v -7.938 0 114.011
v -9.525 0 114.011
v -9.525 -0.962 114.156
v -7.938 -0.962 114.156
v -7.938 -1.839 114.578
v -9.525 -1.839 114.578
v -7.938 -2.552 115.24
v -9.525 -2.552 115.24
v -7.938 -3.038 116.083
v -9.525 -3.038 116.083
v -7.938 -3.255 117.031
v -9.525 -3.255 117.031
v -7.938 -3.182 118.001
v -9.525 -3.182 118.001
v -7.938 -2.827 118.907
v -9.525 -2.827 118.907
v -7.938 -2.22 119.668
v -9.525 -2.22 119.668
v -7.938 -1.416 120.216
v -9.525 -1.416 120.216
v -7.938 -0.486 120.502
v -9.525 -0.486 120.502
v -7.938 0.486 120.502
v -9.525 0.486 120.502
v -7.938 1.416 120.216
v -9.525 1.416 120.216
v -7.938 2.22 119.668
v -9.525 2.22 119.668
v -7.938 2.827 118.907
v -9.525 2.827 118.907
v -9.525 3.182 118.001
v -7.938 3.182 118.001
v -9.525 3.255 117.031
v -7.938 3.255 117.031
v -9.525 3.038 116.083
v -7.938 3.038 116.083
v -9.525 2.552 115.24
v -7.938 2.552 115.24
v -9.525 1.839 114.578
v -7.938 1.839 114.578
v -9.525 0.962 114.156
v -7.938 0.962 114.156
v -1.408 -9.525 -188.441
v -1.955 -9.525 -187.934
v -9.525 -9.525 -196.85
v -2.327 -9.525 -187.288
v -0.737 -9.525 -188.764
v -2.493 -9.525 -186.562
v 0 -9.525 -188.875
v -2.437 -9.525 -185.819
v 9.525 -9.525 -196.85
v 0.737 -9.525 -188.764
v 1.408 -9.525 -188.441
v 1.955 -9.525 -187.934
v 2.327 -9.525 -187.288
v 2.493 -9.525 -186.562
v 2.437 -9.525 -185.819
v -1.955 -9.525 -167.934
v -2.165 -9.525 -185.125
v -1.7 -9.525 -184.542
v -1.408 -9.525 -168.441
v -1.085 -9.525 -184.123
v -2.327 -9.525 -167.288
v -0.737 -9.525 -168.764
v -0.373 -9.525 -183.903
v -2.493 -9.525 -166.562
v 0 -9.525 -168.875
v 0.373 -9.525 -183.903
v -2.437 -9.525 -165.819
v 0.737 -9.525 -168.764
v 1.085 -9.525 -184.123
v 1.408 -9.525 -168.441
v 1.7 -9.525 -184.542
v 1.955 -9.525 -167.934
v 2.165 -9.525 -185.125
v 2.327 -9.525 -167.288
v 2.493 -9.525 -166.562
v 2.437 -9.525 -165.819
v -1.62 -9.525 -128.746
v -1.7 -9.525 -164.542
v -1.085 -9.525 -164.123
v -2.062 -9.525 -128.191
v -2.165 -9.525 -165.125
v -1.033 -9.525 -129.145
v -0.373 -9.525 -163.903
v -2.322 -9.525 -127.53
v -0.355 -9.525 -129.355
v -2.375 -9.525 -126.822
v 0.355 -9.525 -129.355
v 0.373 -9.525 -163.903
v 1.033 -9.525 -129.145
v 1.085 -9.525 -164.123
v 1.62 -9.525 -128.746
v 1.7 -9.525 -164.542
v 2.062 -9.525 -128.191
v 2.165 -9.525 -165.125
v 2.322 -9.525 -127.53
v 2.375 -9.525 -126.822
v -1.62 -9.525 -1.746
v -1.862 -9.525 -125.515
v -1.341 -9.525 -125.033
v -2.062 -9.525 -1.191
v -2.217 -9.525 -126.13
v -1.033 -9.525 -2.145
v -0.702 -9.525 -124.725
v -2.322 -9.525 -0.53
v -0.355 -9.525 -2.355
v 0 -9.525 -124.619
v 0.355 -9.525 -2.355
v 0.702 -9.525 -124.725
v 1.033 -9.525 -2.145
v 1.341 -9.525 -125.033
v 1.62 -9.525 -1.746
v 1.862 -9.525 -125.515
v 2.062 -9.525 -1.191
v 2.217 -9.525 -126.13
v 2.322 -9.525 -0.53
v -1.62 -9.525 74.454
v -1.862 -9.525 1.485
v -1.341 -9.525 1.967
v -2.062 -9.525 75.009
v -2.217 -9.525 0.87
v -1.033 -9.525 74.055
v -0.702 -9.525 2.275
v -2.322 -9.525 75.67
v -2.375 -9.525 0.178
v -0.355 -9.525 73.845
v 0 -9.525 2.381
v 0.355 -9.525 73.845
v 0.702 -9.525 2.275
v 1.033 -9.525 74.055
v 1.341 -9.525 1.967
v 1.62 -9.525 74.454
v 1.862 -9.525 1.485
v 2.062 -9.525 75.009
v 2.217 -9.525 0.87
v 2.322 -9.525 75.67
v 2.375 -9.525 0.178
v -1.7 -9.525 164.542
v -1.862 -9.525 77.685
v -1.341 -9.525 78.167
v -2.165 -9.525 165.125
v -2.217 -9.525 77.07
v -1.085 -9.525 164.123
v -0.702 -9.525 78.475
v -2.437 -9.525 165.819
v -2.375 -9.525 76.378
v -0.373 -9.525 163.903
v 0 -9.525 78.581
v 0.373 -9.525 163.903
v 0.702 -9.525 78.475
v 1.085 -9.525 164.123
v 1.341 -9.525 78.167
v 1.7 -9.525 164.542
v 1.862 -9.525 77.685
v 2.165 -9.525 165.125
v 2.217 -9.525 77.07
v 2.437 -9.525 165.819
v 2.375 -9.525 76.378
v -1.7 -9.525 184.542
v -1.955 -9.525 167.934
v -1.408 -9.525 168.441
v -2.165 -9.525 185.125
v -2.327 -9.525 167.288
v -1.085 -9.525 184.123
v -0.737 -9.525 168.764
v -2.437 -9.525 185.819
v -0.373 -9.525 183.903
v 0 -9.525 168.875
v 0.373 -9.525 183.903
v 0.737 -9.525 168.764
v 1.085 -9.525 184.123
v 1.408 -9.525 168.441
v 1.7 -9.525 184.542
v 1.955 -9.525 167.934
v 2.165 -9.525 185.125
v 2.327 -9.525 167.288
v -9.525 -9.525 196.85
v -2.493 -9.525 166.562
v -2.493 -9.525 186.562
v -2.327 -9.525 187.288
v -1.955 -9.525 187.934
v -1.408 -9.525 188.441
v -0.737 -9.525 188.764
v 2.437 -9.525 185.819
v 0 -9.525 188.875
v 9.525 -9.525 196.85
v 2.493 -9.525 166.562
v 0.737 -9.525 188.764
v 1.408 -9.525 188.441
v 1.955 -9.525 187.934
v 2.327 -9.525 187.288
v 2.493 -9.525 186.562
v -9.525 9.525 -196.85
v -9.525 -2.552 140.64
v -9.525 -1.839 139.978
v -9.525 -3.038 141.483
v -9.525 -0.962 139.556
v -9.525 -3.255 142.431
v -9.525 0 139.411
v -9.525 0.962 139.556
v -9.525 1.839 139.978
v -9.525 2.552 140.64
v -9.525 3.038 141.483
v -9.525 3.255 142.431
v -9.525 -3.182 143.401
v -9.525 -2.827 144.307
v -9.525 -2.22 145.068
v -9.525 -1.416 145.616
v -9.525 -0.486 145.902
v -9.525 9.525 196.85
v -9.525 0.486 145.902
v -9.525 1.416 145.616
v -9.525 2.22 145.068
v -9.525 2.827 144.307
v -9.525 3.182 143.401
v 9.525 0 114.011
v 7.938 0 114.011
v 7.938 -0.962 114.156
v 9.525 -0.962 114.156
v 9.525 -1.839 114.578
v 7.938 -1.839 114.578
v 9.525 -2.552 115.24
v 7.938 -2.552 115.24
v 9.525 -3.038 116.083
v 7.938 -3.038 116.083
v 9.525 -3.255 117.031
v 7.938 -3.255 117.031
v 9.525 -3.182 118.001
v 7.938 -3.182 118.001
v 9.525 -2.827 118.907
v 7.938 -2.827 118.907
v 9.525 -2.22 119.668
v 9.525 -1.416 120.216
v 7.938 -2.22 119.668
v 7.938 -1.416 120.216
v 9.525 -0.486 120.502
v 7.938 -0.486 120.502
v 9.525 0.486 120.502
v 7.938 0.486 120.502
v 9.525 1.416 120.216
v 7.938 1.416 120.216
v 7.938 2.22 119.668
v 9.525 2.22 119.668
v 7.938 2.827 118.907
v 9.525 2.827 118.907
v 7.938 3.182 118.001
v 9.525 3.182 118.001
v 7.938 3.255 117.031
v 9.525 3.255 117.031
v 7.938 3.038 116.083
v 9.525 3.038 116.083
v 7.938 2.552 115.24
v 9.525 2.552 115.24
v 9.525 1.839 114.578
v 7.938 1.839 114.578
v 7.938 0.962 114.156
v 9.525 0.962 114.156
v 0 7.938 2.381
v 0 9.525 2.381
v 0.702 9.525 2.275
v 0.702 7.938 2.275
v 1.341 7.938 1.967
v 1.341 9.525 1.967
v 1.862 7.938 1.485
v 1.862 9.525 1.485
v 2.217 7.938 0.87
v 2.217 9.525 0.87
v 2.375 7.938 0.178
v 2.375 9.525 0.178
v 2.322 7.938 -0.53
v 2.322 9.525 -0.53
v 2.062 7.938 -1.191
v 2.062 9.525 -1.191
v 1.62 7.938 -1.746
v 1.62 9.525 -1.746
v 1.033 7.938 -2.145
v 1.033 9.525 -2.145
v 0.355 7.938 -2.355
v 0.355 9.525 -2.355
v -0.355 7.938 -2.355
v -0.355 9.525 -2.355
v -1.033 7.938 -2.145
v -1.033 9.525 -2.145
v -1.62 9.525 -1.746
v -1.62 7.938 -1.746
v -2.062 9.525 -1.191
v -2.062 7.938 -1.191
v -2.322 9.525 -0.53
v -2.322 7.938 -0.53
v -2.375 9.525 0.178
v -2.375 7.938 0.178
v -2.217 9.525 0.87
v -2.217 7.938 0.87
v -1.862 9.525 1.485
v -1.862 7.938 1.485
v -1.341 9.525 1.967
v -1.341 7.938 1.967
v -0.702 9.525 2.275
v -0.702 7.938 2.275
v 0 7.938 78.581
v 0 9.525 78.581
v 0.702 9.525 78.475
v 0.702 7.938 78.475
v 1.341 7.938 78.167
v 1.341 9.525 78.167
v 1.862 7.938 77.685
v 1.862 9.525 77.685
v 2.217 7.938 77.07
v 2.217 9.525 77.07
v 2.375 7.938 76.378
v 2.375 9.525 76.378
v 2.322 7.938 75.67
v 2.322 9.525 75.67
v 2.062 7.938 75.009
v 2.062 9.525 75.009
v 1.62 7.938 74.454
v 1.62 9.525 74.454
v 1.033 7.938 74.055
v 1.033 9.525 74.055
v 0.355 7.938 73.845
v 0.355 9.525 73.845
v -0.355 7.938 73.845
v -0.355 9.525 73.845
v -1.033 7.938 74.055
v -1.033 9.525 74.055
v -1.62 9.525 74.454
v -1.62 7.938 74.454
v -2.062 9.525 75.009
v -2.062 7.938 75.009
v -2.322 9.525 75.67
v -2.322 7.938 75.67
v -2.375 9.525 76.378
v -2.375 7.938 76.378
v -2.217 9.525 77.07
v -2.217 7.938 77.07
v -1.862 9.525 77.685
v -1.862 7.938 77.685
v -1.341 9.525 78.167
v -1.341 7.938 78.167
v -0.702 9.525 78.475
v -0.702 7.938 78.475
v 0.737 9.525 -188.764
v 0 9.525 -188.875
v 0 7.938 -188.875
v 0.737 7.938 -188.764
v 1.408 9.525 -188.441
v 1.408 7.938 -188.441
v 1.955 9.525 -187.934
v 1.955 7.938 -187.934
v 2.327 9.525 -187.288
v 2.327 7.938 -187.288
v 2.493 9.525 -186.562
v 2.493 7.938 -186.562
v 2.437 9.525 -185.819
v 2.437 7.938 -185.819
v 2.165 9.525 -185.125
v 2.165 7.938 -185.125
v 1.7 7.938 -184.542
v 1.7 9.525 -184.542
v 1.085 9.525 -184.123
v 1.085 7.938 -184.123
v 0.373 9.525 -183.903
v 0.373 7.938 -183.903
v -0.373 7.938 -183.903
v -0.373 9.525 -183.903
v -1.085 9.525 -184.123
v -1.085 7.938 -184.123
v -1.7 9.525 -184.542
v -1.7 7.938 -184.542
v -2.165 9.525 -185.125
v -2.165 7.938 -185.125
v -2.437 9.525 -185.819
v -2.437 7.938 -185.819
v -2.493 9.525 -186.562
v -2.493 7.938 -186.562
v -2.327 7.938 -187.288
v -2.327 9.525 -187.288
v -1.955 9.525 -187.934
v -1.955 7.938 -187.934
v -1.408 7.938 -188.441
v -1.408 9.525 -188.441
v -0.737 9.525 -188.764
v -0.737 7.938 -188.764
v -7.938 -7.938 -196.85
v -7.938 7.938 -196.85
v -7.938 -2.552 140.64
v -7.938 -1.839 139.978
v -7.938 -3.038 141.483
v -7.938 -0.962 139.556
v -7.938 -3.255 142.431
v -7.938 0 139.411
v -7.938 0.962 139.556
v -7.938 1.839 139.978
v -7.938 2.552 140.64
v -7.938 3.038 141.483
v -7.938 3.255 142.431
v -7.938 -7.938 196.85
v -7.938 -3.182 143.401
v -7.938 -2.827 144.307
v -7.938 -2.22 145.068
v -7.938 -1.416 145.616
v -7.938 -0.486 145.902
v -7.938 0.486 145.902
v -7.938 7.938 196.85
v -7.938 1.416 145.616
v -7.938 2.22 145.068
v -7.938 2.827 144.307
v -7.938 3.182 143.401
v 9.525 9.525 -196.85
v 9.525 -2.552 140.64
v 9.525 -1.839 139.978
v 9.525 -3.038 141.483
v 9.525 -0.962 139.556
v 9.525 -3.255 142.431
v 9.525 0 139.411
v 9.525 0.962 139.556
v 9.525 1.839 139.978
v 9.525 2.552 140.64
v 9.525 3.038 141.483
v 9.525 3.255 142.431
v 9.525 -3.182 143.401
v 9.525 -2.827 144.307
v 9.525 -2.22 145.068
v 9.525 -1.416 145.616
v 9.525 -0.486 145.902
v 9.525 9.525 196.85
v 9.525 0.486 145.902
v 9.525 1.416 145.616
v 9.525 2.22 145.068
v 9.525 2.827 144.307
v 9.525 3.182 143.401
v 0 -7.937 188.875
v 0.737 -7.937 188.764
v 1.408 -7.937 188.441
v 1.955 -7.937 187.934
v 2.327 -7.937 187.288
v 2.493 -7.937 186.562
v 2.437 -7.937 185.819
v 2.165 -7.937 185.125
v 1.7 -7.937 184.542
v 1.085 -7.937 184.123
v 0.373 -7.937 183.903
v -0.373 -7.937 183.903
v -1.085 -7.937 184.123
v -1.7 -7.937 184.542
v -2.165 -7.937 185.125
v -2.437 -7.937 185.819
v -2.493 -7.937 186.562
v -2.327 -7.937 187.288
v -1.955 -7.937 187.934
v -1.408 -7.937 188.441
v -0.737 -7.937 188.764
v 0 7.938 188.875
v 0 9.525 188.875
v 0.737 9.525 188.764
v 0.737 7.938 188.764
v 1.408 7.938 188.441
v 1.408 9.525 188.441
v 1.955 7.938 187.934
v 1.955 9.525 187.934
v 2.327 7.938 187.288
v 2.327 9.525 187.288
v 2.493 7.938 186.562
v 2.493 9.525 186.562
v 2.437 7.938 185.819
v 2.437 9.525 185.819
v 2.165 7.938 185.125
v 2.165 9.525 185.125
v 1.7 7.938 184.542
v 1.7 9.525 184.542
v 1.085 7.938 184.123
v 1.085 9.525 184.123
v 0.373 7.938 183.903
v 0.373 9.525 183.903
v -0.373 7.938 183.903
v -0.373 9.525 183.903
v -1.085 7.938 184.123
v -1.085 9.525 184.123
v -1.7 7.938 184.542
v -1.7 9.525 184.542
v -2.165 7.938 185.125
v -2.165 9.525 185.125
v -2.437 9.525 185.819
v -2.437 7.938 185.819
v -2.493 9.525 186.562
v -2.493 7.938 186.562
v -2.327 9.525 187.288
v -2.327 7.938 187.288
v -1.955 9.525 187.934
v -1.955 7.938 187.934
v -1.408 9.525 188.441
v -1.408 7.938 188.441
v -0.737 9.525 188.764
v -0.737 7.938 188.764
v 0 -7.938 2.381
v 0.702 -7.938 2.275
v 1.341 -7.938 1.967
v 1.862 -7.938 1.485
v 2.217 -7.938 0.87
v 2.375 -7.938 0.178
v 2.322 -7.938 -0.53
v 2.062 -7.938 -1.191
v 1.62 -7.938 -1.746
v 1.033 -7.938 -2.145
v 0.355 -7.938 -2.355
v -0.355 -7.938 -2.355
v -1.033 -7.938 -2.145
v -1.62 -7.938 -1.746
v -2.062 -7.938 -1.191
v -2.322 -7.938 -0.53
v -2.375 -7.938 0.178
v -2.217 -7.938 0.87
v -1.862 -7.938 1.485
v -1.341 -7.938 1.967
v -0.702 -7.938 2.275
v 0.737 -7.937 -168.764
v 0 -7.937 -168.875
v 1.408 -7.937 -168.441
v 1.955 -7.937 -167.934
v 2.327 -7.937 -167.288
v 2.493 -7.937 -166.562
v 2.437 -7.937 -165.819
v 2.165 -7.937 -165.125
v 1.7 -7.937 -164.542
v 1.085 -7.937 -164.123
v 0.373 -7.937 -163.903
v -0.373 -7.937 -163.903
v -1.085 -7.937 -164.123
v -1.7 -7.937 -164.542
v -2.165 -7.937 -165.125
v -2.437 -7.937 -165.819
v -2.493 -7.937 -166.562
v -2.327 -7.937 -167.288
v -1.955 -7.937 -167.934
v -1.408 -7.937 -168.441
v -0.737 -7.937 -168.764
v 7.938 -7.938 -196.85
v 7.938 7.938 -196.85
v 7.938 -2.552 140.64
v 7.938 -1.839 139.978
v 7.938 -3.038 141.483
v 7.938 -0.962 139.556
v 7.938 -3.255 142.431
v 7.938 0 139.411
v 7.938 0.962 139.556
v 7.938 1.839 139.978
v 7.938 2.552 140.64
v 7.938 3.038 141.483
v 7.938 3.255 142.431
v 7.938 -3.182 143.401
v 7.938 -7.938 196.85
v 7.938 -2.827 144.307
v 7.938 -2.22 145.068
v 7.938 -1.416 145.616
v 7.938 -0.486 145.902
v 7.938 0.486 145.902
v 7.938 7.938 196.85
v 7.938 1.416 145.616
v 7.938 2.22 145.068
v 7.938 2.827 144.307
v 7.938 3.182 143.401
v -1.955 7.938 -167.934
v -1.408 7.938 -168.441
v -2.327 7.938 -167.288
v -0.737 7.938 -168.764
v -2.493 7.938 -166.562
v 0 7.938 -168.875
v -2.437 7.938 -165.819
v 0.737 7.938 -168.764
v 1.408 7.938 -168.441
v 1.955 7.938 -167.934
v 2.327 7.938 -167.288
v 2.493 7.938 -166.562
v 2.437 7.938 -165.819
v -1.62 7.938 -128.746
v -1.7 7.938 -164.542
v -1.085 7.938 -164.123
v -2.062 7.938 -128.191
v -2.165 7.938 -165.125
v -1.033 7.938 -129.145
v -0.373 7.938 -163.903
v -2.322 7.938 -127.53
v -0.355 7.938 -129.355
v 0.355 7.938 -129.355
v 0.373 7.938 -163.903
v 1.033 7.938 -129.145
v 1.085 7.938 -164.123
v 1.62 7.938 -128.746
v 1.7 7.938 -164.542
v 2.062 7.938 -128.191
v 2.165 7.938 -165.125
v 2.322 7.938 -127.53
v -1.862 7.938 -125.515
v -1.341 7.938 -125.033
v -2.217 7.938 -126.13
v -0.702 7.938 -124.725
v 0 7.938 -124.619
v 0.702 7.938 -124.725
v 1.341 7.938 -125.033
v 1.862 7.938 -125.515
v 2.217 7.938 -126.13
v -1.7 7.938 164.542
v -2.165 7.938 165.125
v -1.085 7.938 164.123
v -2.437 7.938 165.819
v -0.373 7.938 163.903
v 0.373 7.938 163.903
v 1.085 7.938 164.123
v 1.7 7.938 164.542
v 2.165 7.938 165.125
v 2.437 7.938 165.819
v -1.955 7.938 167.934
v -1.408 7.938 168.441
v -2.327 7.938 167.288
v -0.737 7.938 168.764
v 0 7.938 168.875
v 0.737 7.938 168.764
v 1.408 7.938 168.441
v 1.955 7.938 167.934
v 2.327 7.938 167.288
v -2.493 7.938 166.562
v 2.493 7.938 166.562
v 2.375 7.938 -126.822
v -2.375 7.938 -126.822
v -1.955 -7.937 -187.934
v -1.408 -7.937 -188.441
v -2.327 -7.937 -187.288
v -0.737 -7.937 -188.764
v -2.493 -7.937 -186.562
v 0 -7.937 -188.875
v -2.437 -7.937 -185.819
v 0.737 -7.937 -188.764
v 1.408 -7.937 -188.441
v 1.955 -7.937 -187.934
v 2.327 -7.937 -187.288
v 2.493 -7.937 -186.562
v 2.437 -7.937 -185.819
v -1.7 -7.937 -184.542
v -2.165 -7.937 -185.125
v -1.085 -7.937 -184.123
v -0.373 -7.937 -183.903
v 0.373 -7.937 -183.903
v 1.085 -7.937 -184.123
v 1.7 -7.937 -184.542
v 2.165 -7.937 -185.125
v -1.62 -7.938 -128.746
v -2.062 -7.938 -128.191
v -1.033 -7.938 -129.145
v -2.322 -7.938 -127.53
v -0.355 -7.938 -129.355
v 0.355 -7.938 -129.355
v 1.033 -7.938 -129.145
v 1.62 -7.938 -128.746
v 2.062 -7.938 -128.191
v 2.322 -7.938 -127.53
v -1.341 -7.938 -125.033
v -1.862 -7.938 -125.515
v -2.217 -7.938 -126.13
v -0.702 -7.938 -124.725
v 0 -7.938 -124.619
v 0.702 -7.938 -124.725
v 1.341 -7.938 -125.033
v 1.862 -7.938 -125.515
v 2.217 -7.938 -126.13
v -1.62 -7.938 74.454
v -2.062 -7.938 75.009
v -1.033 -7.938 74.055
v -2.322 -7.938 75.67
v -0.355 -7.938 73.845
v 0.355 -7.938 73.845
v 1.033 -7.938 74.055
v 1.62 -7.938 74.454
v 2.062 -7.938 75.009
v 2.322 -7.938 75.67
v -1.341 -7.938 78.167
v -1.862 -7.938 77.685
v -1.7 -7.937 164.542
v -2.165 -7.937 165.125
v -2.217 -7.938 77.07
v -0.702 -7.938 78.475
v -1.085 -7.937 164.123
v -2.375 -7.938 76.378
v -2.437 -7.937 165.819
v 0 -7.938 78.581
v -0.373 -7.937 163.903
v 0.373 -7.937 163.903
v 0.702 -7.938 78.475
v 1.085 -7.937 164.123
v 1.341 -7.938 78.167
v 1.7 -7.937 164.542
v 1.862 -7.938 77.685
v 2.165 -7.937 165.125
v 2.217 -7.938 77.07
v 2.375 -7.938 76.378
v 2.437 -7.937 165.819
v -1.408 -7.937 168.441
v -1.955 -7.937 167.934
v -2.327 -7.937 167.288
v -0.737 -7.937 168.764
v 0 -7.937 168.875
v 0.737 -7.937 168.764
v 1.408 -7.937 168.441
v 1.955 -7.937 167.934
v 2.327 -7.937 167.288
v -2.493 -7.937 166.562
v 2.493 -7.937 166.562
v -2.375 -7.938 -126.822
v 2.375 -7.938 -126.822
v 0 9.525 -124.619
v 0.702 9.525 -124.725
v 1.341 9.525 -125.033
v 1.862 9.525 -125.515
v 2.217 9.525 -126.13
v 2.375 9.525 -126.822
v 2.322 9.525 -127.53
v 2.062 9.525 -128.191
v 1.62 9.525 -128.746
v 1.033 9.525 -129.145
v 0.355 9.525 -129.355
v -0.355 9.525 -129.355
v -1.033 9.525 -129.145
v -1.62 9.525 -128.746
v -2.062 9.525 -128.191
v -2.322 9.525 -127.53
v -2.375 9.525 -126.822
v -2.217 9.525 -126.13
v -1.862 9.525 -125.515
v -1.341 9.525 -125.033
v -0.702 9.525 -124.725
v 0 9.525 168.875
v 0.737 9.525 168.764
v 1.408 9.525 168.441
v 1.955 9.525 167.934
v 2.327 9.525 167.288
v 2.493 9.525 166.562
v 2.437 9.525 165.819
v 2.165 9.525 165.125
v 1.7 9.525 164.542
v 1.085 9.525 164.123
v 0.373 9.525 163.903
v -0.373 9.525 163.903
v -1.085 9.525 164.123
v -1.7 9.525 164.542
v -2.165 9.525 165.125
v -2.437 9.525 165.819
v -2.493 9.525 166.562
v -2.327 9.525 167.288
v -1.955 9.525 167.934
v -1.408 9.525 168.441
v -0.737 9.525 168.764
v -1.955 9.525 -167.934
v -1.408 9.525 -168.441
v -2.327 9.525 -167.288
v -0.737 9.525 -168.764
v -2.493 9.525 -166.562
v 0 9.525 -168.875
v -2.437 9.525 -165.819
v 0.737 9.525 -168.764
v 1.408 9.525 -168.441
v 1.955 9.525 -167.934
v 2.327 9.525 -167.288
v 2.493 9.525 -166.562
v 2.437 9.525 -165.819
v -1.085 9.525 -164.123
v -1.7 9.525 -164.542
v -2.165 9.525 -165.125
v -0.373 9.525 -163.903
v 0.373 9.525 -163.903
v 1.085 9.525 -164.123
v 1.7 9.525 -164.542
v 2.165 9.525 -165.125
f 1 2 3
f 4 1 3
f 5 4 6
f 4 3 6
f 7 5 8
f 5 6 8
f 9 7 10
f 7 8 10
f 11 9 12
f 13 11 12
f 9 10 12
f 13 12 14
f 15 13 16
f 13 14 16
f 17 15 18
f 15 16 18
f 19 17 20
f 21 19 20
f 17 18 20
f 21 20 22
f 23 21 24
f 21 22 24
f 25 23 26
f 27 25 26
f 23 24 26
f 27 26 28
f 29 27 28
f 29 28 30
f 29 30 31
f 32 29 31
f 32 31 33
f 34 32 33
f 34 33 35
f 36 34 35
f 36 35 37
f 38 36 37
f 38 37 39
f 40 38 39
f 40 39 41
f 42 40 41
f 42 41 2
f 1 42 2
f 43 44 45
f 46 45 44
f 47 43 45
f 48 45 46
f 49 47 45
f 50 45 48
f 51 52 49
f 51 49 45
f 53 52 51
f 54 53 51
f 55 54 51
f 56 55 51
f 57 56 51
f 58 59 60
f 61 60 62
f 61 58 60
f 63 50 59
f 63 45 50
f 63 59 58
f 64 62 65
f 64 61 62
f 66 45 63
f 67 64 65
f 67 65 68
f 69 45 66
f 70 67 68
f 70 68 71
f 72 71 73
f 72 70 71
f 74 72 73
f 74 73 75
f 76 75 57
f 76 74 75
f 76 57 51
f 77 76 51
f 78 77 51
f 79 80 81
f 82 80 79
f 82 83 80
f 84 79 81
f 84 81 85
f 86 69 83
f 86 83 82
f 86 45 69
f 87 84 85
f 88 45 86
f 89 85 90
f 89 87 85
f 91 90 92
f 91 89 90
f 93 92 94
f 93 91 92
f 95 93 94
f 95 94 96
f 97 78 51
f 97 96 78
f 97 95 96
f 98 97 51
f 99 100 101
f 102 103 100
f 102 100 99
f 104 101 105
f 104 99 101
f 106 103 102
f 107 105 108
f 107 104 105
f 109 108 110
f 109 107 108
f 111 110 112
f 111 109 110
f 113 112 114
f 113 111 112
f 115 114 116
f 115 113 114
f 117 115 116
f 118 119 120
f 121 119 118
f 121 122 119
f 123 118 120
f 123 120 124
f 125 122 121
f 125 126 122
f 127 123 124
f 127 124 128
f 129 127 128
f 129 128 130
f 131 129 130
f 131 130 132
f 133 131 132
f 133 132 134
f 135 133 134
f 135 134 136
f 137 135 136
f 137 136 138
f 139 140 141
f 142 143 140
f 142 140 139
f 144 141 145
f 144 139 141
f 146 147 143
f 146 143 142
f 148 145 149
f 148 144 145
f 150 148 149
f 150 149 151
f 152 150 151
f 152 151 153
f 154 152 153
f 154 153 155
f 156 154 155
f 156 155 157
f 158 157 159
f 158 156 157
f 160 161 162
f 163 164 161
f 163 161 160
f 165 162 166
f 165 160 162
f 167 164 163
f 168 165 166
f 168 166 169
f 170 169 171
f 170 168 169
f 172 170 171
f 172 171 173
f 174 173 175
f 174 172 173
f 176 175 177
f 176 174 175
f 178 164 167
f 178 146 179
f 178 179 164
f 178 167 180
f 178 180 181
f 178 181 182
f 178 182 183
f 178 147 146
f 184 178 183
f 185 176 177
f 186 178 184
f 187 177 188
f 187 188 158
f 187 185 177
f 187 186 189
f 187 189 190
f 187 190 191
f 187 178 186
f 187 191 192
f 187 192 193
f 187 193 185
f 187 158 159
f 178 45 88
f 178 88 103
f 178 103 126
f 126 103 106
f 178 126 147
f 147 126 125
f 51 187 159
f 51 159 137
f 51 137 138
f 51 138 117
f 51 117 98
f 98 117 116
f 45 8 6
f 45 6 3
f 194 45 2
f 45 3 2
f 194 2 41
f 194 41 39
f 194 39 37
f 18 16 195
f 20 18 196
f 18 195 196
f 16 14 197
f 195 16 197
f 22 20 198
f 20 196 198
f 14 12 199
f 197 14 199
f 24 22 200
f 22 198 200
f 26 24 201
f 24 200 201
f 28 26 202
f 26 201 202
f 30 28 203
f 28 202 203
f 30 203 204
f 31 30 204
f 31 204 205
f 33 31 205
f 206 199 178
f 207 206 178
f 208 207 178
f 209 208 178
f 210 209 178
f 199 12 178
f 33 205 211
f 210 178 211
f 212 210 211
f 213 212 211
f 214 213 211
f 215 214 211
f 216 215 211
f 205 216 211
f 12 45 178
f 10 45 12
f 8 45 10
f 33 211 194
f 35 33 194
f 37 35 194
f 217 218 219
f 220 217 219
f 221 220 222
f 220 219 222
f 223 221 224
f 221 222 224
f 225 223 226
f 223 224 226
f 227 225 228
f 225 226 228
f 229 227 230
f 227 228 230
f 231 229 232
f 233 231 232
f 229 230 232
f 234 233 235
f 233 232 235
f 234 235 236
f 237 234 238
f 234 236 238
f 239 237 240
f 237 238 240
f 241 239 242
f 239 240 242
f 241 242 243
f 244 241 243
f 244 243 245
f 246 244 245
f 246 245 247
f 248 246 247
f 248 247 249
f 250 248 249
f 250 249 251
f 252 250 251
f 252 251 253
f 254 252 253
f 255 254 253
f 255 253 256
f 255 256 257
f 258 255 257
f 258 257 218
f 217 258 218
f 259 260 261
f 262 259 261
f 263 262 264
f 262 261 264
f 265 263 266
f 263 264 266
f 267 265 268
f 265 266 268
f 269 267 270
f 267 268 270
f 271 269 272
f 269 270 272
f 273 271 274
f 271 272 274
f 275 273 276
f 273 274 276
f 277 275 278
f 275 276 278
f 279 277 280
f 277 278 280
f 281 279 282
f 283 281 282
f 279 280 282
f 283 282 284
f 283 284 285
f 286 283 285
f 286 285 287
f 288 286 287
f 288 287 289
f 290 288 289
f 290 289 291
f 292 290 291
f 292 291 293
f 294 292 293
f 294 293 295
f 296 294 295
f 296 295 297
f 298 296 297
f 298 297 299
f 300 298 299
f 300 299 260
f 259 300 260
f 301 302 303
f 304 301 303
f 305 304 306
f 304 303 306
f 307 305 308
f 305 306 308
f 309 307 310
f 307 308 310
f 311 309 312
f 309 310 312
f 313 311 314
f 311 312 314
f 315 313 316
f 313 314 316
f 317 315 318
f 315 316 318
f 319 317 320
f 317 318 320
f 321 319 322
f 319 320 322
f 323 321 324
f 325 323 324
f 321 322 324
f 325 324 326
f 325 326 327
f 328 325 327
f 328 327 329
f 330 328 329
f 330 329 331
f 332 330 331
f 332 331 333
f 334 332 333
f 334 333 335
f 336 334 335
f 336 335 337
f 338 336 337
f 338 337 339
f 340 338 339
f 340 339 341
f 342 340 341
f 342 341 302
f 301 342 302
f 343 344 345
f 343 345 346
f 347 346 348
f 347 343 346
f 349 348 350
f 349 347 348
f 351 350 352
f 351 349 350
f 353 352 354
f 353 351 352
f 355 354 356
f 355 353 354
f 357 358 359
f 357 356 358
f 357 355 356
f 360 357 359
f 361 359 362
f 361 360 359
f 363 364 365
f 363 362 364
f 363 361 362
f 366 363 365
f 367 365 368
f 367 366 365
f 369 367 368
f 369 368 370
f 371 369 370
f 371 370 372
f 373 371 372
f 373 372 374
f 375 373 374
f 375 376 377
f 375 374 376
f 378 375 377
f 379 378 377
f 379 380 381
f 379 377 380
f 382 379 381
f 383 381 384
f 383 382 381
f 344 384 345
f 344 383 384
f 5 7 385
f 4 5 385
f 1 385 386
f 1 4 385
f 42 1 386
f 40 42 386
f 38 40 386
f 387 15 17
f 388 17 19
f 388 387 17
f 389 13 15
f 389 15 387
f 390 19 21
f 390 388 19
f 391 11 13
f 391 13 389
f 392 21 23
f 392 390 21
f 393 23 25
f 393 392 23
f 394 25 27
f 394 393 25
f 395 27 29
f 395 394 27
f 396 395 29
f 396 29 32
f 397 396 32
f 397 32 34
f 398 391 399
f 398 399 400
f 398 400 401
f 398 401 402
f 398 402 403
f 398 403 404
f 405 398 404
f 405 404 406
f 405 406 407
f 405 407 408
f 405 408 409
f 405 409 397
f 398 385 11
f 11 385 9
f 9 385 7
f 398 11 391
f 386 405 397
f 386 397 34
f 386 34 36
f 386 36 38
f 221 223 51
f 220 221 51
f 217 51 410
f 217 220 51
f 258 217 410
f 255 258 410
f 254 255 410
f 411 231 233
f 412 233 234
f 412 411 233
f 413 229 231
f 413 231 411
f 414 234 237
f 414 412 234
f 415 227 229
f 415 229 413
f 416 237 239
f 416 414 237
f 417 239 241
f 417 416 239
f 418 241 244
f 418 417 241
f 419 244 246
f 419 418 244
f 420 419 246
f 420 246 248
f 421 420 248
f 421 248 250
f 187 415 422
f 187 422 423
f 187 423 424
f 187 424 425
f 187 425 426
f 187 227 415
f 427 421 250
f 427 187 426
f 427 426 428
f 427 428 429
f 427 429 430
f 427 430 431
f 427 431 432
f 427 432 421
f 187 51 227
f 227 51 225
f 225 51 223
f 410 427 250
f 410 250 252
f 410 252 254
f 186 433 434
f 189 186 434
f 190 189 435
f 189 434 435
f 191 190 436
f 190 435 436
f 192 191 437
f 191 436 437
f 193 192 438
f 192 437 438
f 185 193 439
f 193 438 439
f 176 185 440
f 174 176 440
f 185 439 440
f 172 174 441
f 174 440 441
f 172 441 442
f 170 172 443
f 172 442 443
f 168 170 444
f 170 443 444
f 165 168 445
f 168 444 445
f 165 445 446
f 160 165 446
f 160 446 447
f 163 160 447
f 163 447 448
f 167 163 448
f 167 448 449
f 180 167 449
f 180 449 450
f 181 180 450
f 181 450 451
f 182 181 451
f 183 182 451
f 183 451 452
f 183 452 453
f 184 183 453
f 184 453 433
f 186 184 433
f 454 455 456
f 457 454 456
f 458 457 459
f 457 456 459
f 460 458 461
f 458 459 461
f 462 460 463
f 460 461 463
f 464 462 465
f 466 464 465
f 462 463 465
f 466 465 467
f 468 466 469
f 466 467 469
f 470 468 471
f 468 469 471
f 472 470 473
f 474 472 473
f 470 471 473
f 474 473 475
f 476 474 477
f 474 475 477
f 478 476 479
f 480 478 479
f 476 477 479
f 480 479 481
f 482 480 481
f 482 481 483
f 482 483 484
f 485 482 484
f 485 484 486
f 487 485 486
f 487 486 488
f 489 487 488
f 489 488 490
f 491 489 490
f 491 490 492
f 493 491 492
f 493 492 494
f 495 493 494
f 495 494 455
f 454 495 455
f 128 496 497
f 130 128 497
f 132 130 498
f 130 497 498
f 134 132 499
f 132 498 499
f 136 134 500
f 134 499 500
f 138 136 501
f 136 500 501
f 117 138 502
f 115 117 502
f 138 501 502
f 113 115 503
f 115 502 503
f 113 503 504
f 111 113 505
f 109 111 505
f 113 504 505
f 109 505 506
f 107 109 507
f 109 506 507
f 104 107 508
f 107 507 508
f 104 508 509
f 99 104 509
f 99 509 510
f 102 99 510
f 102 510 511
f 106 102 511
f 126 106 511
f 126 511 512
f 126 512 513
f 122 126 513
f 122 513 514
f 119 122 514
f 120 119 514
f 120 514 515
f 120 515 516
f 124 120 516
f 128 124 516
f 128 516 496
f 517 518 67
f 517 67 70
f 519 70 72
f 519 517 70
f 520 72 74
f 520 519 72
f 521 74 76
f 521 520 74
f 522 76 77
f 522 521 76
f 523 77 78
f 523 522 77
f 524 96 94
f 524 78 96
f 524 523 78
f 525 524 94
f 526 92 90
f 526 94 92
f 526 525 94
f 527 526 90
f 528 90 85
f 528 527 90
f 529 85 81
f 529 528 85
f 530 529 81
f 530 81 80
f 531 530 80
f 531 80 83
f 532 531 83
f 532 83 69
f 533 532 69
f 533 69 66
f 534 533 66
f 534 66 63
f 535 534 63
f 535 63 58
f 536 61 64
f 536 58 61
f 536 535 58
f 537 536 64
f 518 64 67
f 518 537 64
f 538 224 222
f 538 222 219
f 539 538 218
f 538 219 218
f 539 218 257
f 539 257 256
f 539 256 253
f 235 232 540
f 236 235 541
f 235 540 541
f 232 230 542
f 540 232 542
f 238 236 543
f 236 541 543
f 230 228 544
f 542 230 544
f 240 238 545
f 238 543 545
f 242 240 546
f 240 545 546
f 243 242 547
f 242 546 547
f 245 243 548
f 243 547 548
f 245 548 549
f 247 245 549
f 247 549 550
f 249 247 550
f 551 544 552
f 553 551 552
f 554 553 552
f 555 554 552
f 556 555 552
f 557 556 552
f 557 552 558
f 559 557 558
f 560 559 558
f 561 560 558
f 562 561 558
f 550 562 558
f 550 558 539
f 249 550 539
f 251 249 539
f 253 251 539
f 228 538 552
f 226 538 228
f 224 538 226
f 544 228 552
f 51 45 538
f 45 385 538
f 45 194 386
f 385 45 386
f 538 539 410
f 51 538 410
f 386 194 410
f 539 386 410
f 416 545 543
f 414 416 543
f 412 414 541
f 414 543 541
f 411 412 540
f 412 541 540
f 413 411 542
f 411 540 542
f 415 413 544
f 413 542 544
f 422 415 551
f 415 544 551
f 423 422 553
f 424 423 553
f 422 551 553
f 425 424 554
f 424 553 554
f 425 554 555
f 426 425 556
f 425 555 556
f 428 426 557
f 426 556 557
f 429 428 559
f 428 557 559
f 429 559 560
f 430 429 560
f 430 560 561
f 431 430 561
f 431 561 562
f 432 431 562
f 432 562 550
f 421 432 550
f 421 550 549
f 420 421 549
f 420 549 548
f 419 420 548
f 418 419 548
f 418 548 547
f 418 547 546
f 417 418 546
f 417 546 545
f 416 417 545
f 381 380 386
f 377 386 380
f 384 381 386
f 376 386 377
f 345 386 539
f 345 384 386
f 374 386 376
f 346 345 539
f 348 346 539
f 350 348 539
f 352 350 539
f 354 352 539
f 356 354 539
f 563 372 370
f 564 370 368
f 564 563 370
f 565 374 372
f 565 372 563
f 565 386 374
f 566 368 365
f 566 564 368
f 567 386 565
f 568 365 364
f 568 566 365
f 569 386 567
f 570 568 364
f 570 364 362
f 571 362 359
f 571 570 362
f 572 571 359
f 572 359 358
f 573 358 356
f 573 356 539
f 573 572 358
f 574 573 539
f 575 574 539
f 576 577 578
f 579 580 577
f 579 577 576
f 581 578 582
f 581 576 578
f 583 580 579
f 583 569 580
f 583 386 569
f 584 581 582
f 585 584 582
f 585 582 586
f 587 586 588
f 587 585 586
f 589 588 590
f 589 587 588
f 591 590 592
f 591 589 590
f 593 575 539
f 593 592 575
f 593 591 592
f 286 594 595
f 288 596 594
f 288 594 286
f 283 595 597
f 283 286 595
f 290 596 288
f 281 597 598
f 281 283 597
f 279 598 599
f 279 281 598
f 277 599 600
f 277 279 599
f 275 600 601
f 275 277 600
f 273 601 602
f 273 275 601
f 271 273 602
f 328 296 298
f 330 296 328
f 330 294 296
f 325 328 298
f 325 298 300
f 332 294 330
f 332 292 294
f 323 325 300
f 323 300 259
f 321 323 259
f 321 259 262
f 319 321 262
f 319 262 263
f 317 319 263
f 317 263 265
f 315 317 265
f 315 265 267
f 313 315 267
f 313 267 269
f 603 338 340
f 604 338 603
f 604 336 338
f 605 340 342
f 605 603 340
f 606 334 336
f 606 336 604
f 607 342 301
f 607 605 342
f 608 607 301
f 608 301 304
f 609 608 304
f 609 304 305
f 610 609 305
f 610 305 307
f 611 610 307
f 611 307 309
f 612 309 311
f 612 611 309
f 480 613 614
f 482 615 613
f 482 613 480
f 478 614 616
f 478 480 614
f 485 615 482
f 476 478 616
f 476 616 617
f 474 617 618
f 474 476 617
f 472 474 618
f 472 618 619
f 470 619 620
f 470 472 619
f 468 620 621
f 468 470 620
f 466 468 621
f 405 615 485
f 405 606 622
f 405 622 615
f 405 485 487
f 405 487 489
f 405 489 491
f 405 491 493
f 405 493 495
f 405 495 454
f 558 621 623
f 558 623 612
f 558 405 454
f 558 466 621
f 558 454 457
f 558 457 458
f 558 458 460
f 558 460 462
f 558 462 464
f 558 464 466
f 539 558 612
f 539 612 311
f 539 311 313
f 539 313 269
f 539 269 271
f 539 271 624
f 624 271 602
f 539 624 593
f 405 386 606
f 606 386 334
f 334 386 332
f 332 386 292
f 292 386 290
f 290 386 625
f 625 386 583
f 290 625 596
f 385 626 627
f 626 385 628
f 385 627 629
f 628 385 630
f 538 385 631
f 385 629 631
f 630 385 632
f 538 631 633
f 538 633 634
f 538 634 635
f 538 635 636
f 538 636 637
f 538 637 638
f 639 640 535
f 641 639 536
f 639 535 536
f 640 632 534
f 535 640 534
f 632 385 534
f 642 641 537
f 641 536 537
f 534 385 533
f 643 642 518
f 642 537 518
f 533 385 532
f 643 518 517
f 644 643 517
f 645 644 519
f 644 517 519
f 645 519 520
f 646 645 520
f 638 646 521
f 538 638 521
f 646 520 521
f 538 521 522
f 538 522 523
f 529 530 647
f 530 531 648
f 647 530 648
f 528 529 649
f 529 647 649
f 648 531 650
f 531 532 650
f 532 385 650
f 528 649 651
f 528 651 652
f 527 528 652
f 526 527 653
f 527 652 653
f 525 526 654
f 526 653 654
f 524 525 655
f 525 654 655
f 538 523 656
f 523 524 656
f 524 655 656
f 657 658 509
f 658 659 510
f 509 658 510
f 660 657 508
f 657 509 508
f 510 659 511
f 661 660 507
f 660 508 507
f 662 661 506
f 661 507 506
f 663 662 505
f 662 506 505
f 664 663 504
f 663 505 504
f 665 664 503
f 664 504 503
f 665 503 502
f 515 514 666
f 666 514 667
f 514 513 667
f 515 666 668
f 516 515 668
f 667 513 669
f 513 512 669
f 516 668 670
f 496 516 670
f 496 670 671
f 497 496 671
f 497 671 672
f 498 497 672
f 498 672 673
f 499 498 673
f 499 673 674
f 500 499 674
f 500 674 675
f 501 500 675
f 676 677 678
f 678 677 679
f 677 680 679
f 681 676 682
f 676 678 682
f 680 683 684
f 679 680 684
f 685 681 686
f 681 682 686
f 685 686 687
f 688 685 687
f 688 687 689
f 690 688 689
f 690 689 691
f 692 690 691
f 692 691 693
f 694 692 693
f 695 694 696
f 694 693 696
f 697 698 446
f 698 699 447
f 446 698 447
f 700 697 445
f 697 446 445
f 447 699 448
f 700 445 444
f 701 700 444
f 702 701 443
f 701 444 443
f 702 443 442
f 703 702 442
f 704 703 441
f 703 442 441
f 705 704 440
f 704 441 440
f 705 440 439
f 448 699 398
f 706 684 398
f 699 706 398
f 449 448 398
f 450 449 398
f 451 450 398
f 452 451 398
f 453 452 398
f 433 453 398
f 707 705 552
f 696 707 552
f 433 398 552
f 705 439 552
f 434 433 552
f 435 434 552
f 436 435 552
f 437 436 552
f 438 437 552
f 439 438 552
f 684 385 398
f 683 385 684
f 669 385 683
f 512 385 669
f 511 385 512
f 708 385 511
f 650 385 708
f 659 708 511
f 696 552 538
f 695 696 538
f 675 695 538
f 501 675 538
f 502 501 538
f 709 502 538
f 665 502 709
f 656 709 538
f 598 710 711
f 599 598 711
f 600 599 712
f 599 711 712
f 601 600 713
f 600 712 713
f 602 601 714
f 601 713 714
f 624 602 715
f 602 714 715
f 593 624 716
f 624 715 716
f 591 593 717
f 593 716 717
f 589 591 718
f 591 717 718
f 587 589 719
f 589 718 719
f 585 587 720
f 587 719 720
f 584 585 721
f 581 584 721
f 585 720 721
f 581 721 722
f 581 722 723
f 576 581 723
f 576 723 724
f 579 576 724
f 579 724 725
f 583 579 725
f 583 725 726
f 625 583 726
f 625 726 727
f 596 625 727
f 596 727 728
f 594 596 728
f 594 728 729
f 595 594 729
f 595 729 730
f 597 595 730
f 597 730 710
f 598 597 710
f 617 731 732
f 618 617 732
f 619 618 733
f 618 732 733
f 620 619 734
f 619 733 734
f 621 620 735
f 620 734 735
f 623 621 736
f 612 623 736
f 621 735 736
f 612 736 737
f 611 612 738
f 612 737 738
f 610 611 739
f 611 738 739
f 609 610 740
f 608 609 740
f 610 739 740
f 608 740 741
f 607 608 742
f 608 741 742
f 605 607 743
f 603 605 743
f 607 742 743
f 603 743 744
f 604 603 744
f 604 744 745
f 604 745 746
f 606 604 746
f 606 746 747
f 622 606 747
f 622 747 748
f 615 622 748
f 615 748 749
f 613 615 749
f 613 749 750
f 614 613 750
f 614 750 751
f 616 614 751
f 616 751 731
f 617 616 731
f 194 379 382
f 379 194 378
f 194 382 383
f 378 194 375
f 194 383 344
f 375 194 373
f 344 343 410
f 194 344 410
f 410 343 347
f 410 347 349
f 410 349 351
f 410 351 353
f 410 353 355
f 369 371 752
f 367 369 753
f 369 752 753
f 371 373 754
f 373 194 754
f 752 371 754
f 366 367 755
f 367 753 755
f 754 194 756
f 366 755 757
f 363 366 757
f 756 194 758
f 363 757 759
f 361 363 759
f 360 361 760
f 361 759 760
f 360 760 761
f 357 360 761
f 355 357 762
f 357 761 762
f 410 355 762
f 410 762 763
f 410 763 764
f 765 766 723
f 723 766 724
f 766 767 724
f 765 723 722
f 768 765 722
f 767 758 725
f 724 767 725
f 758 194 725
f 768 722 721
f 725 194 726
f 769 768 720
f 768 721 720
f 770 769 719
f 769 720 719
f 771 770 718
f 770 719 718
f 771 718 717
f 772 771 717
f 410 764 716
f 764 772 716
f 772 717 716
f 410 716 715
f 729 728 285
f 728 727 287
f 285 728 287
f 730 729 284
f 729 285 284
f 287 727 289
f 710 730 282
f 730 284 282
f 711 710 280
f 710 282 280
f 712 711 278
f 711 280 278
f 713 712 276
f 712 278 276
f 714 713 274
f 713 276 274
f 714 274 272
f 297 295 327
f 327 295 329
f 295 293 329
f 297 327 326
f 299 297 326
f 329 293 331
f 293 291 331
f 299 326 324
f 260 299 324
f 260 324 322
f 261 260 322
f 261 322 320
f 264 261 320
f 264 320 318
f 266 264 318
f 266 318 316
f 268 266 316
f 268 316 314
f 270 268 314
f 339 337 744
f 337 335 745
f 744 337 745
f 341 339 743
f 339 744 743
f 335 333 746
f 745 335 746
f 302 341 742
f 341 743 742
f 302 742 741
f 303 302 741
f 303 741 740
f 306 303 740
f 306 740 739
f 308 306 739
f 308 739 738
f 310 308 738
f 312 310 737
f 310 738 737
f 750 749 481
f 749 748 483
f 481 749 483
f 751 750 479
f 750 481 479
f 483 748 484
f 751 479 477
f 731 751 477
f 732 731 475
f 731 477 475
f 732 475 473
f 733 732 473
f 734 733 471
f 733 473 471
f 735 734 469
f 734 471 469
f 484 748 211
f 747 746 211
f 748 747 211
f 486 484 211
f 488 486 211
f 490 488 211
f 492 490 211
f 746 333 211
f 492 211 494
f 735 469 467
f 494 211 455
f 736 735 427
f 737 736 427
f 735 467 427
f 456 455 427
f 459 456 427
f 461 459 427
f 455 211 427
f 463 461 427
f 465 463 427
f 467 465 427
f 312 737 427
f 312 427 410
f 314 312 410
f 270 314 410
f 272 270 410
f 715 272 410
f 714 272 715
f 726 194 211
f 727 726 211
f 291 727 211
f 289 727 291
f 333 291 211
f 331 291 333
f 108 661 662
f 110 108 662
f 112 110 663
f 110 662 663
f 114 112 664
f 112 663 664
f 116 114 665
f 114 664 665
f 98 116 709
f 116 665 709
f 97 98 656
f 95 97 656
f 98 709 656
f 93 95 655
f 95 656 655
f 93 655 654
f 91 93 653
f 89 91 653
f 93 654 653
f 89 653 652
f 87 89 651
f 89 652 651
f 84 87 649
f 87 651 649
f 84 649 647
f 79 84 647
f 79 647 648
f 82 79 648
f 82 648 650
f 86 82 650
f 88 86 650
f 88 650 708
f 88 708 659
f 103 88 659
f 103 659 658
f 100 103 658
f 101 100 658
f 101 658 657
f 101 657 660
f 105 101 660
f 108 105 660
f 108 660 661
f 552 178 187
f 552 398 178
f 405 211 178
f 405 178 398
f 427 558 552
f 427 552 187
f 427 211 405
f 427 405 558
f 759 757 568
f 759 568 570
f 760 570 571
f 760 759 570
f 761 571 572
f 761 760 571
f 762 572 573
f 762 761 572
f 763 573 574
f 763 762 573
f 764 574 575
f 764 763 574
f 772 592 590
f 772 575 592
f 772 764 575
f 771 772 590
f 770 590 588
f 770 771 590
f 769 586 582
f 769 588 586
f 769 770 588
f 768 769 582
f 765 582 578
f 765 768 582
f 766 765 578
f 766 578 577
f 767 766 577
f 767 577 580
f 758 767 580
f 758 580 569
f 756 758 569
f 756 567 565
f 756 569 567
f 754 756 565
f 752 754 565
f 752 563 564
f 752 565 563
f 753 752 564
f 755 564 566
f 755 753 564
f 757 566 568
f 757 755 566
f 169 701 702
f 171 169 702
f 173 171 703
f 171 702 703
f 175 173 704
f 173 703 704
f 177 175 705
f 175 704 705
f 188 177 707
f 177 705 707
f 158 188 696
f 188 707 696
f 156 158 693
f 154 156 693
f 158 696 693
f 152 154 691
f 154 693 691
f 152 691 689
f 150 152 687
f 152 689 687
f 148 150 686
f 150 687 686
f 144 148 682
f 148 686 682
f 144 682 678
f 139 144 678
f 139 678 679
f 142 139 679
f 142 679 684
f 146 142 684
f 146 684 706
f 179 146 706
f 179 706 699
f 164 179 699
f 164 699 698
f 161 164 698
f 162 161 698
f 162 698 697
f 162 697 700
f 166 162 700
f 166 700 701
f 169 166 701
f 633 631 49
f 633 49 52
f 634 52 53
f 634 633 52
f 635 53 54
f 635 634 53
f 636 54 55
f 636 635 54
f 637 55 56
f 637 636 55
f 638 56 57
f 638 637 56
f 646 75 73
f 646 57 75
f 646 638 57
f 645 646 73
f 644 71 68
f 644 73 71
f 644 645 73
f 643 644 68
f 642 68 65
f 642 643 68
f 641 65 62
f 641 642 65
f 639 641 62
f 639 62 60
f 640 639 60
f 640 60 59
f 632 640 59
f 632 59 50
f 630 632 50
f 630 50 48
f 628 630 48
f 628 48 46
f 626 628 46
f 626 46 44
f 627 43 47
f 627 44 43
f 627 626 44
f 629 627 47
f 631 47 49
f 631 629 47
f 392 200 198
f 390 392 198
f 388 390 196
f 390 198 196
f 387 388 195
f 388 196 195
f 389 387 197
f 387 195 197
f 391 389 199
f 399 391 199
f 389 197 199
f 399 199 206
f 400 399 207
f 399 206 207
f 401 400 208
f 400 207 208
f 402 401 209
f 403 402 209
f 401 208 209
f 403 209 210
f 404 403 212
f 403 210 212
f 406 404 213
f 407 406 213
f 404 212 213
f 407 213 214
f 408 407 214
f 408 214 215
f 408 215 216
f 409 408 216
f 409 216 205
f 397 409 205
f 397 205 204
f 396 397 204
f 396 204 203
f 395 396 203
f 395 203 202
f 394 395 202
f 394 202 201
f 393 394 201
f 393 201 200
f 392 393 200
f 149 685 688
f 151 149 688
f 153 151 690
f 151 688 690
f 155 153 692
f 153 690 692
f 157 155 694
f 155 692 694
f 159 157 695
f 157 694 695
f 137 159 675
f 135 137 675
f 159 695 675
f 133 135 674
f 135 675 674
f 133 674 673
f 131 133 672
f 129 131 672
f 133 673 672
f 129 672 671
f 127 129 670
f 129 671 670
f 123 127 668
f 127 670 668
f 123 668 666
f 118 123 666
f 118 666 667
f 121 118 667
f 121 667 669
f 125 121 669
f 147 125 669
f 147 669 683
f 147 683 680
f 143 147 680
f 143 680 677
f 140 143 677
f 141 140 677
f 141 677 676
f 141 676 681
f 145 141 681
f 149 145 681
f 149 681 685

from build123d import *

# Parameters (mm, degrees)
SKETCH1_W           = 19.05
SKETCH1_H           = 19.05
SKETCH1_W_2         = 15.875
SKETCH1_H_2         = 15.875
BOSS_EXTRUDE1_DEPTH = 196.85
SKETCH2_R           = 2.5
CUT_EXTRUDE1_DEPTH  = 30
SKETCH3_R           = 3.2639
CUT_EXTRUDE2_DEPTH  = 30
SKETCH4_R           = 2.38125
CUT_EXTRUDE3_DEPTH  = 30


with BuildPart() as part:
    # Sketch1 → Boss-Extrude1 (new, symmetric)
    with BuildSketch(Plane.XY):
        Rectangle(SKETCH1_W, SKETCH1_H)
        Rectangle(SKETCH1_W_2, SKETCH1_H_2, mode=Mode.SUBTRACT)
    extrude(amount=BOSS_EXTRUDE1_DEPTH, both=True)

    # Sketch2 → Cut-Extrude1 (cut)
    with BuildSketch(Plane(origin=(0, 13.525, 0), x_dir=(1, 0, 0), z_dir=(0, 1, 0))):
        with Locations(Location((0, -186.375, 0), (0, 0, 270))):
            Circle(SKETCH2_R)
        with Locations(Location((0, -166.375, 0), (0, 0, 270))):
            Circle(SKETCH2_R)
    cut_extrude1 = extrude(amount=-CUT_EXTRUDE1_DEPTH, mode=Mode.SUBTRACT)

    # Mirror1: Cut-Extrude1 across Front Plane
    add(cut_extrude1.mirror(Plane.XY), mode=Mode.SUBTRACT)

    # Sketch3 → Cut-Extrude2 (cut)
    with BuildSketch(Plane.ZY.offset(14.3002)):
        with Locations(Location((142.675, 0, 0), (0, 0, 180))):
            Circle(SKETCH3_R)
        with Locations(Location((117.275, 0, 0), (0, 0, 180))):
            Circle(SKETCH3_R)
    extrude(amount=-CUT_EXTRUDE2_DEPTH, mode=Mode.SUBTRACT)

    # Sketch4 → Cut-Extrude3 (cut)
    with BuildSketch(Plane(origin=(0, 18.1864, 0), x_dir=(1, 0, 0), z_dir=(0, 1, 0))):
        with Locations(Location((0, 0, 0), (0, 0, 270))):
            Circle(SKETCH4_R)
        with Locations(Location((0, 127, 0), (0, 0, 270))):
            Circle(SKETCH4_R)
        with Locations(Location((0, -76.2, 0), (0, 0, 270))):
            Circle(SKETCH4_R)
    extrude(amount=-CUT_EXTRUDE3_DEPTH, mode=Mode.SUBTRACT)


solid = part.part
